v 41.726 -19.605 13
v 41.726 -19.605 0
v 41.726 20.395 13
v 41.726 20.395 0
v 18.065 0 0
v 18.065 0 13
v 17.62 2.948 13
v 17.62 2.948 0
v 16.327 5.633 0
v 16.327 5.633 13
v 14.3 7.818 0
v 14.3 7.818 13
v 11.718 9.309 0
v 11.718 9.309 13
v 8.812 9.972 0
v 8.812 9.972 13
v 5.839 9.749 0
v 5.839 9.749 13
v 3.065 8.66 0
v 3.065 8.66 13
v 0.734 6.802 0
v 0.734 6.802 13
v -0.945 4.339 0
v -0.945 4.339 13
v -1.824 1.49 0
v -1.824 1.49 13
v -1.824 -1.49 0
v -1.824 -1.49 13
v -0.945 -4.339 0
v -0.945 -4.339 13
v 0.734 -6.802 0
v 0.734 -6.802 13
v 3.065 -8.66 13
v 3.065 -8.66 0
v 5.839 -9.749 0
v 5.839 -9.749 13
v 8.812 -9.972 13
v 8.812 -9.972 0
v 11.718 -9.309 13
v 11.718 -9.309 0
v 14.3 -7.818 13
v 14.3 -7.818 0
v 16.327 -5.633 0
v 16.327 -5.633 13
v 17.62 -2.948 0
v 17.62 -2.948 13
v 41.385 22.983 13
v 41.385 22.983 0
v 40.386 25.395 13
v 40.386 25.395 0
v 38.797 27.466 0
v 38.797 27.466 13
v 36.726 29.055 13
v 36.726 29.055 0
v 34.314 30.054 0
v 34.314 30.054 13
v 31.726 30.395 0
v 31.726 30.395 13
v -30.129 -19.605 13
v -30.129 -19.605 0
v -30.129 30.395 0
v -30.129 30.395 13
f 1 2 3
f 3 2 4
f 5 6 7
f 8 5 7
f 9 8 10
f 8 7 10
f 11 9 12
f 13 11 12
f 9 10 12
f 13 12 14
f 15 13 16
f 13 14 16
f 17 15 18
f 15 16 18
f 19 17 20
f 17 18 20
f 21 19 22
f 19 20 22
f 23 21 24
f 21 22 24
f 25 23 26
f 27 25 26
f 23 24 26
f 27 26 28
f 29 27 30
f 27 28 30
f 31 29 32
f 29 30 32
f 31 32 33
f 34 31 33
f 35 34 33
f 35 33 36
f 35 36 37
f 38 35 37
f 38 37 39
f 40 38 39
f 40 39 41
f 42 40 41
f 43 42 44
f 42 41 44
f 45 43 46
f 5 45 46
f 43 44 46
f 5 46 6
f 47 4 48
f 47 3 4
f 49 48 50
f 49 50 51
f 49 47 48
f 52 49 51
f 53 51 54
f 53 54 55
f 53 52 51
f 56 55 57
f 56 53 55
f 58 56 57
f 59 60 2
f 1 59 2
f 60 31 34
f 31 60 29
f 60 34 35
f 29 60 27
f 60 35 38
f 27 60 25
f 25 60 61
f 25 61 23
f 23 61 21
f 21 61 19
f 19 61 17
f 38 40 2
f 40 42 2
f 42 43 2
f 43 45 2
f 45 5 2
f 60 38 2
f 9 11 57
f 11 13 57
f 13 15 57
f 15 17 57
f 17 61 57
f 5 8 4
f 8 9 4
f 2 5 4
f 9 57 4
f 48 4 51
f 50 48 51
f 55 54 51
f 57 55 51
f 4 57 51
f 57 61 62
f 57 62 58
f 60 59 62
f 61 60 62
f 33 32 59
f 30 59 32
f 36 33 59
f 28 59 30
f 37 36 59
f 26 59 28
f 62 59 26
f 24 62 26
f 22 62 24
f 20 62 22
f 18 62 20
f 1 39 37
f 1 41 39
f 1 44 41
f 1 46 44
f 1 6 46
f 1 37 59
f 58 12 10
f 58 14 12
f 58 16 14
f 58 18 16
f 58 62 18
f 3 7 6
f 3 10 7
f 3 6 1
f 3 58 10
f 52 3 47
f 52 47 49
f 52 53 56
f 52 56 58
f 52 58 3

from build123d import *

# Parameters (mm, degrees)
SKETCH_2_W          = 100
SKETCH_2_H          = 50
EXTRUDE_1_DEPTH     = 13
FILLET_1_R          = 10
SKETCH_3_R          = 10
CUT_EXTRUDE_1_DEPTH = 13
SKETCH_4_W          = 28.145361764
SKETCH_4_H          = 50
CUT_EXTRUDE_2_DEPTH = 13


with BuildPart() as part:
    # 草图2 → 凸台-拉伸1 (new body)
    with BuildSketch(Plane.XY):
        with Locations((-8.273923568, 5.39517388)):
            Rectangle(SKETCH_2_W, SKETCH_2_H)
    extrude(amount=EXTRUDE_1_DEPTH)

    # 圆角1
    fillet_1_edges = [part.edges().sort_by_distance(p)[0] for p in [
        (41.726076432, 30.39517388, 6.5),
    ]]
    fillet(fillet_1_edges, radius=FILLET_1_R)

    # 草图3 → 切除-拉伸1 (cut)
    with BuildSketch(Plane.XY.offset(13)):
        with Locations((8.064626437, 0)):
            Circle(SKETCH_3_R)
    extrude(amount=-CUT_EXTRUDE_1_DEPTH, mode=Mode.SUBTRACT)

    # 草图4 → 切除-拉伸2 (cut)
    with BuildSketch(Plane.XY.offset(13)):
        with Locations((-44.201242686, 5.39517388)):
            Rectangle(SKETCH_4_W, SKETCH_4_H)
    extrude(amount=-CUT_EXTRUDE_2_DEPTH, mode=Mode.SUBTRACT)


solid = part.part
